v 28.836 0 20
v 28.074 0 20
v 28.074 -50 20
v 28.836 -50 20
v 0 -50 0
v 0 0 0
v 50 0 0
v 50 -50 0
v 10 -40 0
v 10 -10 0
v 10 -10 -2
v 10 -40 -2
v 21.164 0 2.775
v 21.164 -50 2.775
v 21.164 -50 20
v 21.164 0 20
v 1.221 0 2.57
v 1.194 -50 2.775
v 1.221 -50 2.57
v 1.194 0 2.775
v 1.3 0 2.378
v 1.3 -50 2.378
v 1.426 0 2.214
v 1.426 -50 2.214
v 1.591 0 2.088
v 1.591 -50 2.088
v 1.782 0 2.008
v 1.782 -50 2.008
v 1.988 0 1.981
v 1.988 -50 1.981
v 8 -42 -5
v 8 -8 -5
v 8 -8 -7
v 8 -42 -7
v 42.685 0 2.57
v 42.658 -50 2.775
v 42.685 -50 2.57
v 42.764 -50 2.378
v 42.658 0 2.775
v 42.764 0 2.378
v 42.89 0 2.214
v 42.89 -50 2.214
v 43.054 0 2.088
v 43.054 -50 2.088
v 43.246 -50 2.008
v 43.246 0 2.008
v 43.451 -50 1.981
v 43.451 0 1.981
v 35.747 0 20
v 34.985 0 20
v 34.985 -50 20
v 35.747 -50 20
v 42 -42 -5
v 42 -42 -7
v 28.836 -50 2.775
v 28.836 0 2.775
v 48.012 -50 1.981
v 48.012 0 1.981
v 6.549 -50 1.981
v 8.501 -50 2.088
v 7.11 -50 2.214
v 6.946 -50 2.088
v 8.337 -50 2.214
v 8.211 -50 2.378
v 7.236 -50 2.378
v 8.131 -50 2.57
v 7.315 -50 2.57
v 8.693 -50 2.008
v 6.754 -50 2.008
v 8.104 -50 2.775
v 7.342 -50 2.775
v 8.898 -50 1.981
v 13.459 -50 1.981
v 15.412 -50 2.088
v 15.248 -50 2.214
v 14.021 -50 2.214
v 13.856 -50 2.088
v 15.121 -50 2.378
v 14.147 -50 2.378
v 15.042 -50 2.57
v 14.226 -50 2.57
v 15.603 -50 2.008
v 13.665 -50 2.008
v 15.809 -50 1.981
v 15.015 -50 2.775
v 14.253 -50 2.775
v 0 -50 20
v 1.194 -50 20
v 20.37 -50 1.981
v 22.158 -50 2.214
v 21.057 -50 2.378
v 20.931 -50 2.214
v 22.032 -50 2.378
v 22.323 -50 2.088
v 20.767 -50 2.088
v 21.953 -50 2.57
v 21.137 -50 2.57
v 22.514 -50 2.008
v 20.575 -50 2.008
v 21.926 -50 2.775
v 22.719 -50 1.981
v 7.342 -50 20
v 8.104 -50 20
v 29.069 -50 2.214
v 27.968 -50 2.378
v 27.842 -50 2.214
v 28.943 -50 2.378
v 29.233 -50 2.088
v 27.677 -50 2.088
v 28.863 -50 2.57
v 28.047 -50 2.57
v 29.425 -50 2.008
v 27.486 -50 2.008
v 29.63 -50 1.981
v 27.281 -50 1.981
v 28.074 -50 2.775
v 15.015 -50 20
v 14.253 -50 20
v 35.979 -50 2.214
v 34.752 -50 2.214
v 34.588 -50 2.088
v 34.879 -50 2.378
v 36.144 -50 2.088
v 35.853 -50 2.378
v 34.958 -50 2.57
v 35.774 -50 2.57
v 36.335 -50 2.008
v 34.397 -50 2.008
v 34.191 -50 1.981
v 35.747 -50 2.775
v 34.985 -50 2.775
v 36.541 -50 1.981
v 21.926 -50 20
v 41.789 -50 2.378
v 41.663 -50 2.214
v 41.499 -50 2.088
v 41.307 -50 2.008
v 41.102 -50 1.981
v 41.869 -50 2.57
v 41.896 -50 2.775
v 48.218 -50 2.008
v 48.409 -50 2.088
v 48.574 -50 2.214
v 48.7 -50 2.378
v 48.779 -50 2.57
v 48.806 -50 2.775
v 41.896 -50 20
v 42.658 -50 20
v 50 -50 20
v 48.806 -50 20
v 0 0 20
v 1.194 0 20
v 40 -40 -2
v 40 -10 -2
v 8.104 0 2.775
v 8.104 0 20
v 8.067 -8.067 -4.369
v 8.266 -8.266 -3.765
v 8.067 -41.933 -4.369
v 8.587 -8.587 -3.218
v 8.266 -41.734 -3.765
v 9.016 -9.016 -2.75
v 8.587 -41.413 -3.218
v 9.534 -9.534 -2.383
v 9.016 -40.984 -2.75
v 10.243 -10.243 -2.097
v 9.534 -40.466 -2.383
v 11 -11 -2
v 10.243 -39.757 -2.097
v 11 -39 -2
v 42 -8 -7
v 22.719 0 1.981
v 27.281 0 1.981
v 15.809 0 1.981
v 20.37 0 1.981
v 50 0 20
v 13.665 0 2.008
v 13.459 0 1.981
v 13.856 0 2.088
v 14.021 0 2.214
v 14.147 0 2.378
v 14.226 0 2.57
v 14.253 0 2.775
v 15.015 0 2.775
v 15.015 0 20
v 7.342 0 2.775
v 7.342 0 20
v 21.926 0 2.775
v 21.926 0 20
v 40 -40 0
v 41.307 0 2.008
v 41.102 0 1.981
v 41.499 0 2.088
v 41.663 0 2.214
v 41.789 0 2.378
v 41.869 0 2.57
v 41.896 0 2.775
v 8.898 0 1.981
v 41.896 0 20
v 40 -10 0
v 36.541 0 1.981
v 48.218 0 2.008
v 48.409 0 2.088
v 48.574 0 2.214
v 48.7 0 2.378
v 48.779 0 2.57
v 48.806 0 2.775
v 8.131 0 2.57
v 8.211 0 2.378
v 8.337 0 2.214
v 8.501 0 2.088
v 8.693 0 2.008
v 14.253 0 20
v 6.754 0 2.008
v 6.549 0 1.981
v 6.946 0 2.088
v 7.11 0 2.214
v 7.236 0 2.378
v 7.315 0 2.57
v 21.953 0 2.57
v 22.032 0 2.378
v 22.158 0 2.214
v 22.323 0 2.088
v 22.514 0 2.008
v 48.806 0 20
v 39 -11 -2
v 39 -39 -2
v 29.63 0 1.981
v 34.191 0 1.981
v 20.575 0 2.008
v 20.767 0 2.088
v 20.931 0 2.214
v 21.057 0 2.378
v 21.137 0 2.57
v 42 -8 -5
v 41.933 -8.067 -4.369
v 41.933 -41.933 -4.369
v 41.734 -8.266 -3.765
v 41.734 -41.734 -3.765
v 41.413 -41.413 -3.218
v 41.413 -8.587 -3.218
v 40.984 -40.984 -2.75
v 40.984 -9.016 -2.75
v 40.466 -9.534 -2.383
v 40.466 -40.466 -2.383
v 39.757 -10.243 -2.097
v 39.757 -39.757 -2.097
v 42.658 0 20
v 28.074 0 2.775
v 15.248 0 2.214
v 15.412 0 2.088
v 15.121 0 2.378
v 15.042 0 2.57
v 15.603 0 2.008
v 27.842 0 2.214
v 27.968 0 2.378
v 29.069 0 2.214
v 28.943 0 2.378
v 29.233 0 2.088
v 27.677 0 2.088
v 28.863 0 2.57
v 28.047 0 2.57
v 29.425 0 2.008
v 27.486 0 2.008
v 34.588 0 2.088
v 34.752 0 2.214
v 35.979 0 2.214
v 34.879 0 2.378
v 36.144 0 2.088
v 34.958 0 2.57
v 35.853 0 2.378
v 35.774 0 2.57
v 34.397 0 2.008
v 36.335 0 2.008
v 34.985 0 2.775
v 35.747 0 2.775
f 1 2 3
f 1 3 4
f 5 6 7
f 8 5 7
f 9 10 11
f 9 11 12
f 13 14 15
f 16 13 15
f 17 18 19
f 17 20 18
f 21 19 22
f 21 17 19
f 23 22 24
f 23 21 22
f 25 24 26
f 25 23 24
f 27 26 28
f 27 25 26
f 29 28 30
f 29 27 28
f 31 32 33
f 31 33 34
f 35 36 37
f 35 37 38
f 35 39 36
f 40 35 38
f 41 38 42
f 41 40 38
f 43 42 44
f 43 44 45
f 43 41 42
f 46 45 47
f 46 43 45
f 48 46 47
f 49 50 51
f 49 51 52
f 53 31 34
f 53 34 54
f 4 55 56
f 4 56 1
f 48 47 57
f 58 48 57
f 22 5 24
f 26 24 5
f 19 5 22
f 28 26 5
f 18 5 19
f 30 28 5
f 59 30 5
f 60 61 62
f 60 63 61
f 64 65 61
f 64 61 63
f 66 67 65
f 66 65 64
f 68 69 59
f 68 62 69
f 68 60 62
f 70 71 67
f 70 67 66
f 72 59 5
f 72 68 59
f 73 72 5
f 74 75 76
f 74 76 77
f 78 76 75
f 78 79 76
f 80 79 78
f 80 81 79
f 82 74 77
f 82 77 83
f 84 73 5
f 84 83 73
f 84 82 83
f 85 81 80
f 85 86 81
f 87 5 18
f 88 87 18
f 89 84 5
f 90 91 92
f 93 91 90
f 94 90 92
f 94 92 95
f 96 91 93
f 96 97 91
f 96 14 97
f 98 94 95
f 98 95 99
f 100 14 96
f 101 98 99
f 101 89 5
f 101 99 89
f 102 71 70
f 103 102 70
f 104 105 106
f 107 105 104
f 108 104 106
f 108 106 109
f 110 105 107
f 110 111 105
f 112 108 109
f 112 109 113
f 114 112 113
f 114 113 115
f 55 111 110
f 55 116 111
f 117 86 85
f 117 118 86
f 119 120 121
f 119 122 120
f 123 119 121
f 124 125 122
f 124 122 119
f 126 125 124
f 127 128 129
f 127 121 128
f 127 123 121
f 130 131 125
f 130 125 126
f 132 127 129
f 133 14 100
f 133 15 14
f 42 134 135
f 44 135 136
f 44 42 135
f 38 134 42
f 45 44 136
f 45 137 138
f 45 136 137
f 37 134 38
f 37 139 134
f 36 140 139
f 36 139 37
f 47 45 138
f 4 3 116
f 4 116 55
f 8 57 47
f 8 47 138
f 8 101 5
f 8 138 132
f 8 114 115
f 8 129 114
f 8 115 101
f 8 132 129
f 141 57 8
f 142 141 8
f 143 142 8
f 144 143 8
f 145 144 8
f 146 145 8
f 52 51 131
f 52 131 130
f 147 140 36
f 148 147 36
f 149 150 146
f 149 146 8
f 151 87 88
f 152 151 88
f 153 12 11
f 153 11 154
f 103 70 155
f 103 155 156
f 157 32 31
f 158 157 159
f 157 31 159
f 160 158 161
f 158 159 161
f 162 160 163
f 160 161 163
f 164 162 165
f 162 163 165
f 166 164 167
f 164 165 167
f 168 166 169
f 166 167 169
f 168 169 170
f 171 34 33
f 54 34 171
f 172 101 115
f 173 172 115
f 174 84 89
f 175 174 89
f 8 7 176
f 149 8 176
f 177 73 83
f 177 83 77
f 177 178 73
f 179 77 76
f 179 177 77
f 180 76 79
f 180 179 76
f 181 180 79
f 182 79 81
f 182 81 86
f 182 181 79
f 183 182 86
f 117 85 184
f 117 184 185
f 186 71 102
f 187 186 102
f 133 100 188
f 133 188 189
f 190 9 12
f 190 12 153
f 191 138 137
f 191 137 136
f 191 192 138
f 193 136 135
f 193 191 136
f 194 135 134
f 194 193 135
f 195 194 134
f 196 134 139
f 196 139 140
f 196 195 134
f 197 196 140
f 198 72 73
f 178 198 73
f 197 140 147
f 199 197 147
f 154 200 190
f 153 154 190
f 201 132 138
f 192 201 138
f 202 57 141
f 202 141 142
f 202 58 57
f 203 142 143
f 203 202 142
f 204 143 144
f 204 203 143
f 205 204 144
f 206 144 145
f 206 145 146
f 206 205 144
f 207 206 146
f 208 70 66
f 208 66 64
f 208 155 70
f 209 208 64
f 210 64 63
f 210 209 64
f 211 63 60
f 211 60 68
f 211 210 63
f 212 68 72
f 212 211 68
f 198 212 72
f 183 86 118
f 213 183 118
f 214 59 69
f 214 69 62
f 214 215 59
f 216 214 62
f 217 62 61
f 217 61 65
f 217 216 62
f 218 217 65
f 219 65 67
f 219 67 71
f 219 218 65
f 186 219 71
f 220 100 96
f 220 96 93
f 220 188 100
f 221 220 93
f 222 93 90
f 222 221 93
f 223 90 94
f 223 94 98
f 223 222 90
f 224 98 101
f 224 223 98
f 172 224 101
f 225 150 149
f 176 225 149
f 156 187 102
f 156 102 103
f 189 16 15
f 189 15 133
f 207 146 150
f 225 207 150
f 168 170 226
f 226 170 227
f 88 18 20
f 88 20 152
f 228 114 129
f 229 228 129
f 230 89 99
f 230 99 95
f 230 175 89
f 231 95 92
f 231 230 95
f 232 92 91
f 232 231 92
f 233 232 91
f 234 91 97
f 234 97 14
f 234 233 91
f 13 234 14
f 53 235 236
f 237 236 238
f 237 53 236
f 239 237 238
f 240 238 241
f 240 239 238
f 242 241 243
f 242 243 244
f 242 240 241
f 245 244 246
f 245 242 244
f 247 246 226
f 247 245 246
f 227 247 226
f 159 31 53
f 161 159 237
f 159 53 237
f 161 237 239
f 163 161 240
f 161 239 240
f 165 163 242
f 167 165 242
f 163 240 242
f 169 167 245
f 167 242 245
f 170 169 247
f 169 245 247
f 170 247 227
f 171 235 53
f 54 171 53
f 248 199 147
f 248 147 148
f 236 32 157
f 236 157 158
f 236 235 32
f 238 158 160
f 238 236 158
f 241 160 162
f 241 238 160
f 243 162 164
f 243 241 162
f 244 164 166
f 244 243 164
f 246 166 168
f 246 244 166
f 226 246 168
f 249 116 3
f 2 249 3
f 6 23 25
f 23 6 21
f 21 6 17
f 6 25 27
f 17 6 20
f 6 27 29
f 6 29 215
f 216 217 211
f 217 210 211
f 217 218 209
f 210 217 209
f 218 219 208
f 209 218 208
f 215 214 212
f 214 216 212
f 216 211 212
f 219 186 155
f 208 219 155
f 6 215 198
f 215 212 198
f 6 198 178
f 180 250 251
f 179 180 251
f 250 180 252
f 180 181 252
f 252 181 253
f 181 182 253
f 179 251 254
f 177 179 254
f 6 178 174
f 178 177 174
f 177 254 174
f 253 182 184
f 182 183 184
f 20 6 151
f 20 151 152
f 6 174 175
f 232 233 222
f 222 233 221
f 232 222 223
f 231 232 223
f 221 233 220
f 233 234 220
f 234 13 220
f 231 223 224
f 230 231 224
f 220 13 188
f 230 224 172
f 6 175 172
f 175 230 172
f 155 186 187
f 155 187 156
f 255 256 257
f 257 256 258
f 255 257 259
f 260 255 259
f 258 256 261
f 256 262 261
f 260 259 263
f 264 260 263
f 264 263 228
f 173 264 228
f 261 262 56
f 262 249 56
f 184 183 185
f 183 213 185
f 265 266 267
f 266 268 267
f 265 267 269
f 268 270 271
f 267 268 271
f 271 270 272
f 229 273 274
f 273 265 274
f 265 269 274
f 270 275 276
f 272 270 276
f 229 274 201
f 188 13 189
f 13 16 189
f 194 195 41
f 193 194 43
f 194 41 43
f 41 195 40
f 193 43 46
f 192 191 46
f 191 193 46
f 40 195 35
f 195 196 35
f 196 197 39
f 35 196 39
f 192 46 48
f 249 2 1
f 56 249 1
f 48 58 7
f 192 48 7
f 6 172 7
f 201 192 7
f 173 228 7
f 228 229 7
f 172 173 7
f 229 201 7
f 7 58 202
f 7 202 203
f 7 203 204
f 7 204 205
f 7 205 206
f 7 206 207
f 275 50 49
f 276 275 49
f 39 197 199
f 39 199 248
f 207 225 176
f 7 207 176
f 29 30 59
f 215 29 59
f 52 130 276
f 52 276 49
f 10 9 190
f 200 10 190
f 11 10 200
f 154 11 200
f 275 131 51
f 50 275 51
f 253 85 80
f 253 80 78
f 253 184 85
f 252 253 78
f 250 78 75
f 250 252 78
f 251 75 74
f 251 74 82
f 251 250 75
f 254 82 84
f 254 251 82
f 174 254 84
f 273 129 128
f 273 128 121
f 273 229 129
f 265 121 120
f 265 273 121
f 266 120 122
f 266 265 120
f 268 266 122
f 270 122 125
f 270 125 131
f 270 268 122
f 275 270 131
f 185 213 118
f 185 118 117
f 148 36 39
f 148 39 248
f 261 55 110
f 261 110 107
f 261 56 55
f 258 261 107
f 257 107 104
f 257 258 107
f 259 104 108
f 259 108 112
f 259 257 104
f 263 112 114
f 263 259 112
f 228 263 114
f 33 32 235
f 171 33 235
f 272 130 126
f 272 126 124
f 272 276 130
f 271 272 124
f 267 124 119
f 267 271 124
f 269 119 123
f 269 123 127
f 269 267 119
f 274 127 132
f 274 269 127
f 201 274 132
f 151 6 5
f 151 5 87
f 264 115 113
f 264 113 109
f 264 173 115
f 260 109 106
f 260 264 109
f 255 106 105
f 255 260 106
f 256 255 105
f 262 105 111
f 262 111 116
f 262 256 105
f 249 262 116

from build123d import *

# Parameters (mm, degrees)
F0_W     = 50
F0_H     = 20
F1_DEPTH = 50
F2_W     = 6.148629
F2_H     = 18.0188
F2_W_2   = 6.148628
F3_DEPTH = 50.001
F4_R     = 0.79375
F5_W     = 30
F5_H     = 30
F6_DEPTH = 2
F7_W     = 34
F7_H     = 34
F8_DEPTH = 5
F9_R     = 3


with BuildPart() as f1:
    # F0 (on Front) → F1 (new body)
    with BuildSketch(Plane.XZ):
        with Locations((25, 10)):
            Rectangle(F0_W, F0_H)
    extrude(amount=F1_DEPTH)

    # F2 (on face) → F3 (cut, through all)
    with BuildSketch(Plane.XZ.offset(50)):
        with Locations((4.268115, 10.9906)):
            Rectangle(F2_W, F2_H)
        with Locations((11.178743, 10.9906)):
            Rectangle(F2_W_2, F2_H)
        with Locations((18.089371, 10.9906)):
            Rectangle(F2_W, F2_H)
        with Locations((25, 10.9906)):
            Rectangle(F2_W_2, F2_H)
        with Locations((31.910629, 10.9906)):
            Rectangle(F2_W, F2_H)
        with Locations((38.821257, 10.9906)):
            Rectangle(F2_W_2, F2_H)
        with Locations((45.731885, 10.9906)):
            Rectangle(F2_W, F2_H)
    extrude(amount=-F3_DEPTH, mode=Mode.SUBTRACT)

    # F4
    f4_edges = [f1.edges().sort_by_distance(p)[0] for p in [
        (1.1938, -25, 1.9812),
        (7.342429, -25, 1.9812),
        (8.104429, -25, 1.9812),
        (14.253057, -25, 1.9812),
        (15.015057, -25, 1.9812),
        (21.163686, -25, 1.9812),
        (21.925686, -25, 1.9812),
        (28.074314, -25, 1.9812),
        (28.836314, -25, 1.9812),
        (34.984943, -25, 1.9812),
        (35.746943, -25, 1.9812),
        (41.895571, -25, 1.9812),
        (42.657571, -25, 1.9812),
        (48.8062, -25, 1.9812),
    ]]
    fillet(f4_edges, radius=F4_R)


with BuildPart() as f6:
    # F5 (on face) → F6 (new body)
    with BuildSketch(Plane(origin=(0, 0, 0), x_dir=(1, 0, 0), z_dir=(0, 0, -1))):
        with Locations((25, 25)):
            Rectangle(F5_W, F5_H)
    extrude(amount=F6_DEPTH)


with BuildPart() as f8:
    # F7 (on face) → F8 (new body)
    with BuildSketch(Plane(origin=(0, 0, -2), x_dir=(1, 0, 0), z_dir=(0, 0, -1))):
        with Locations((25, 25)):
            Rectangle(F7_W, F7_H)
    extrude(amount=F8_DEPTH)

    # F9
    f9_edges = [f8.edges().sort_by_distance(p)[0] for p in [
        (8, -25, -2),
        (25, -42, -2),
        (25, -8, -2),
        (42, -25, -2),
    ]]
    fillet(f9_edges, radius=F9_R)


solid = Compound([f1.part, f6.part, f8.part])
